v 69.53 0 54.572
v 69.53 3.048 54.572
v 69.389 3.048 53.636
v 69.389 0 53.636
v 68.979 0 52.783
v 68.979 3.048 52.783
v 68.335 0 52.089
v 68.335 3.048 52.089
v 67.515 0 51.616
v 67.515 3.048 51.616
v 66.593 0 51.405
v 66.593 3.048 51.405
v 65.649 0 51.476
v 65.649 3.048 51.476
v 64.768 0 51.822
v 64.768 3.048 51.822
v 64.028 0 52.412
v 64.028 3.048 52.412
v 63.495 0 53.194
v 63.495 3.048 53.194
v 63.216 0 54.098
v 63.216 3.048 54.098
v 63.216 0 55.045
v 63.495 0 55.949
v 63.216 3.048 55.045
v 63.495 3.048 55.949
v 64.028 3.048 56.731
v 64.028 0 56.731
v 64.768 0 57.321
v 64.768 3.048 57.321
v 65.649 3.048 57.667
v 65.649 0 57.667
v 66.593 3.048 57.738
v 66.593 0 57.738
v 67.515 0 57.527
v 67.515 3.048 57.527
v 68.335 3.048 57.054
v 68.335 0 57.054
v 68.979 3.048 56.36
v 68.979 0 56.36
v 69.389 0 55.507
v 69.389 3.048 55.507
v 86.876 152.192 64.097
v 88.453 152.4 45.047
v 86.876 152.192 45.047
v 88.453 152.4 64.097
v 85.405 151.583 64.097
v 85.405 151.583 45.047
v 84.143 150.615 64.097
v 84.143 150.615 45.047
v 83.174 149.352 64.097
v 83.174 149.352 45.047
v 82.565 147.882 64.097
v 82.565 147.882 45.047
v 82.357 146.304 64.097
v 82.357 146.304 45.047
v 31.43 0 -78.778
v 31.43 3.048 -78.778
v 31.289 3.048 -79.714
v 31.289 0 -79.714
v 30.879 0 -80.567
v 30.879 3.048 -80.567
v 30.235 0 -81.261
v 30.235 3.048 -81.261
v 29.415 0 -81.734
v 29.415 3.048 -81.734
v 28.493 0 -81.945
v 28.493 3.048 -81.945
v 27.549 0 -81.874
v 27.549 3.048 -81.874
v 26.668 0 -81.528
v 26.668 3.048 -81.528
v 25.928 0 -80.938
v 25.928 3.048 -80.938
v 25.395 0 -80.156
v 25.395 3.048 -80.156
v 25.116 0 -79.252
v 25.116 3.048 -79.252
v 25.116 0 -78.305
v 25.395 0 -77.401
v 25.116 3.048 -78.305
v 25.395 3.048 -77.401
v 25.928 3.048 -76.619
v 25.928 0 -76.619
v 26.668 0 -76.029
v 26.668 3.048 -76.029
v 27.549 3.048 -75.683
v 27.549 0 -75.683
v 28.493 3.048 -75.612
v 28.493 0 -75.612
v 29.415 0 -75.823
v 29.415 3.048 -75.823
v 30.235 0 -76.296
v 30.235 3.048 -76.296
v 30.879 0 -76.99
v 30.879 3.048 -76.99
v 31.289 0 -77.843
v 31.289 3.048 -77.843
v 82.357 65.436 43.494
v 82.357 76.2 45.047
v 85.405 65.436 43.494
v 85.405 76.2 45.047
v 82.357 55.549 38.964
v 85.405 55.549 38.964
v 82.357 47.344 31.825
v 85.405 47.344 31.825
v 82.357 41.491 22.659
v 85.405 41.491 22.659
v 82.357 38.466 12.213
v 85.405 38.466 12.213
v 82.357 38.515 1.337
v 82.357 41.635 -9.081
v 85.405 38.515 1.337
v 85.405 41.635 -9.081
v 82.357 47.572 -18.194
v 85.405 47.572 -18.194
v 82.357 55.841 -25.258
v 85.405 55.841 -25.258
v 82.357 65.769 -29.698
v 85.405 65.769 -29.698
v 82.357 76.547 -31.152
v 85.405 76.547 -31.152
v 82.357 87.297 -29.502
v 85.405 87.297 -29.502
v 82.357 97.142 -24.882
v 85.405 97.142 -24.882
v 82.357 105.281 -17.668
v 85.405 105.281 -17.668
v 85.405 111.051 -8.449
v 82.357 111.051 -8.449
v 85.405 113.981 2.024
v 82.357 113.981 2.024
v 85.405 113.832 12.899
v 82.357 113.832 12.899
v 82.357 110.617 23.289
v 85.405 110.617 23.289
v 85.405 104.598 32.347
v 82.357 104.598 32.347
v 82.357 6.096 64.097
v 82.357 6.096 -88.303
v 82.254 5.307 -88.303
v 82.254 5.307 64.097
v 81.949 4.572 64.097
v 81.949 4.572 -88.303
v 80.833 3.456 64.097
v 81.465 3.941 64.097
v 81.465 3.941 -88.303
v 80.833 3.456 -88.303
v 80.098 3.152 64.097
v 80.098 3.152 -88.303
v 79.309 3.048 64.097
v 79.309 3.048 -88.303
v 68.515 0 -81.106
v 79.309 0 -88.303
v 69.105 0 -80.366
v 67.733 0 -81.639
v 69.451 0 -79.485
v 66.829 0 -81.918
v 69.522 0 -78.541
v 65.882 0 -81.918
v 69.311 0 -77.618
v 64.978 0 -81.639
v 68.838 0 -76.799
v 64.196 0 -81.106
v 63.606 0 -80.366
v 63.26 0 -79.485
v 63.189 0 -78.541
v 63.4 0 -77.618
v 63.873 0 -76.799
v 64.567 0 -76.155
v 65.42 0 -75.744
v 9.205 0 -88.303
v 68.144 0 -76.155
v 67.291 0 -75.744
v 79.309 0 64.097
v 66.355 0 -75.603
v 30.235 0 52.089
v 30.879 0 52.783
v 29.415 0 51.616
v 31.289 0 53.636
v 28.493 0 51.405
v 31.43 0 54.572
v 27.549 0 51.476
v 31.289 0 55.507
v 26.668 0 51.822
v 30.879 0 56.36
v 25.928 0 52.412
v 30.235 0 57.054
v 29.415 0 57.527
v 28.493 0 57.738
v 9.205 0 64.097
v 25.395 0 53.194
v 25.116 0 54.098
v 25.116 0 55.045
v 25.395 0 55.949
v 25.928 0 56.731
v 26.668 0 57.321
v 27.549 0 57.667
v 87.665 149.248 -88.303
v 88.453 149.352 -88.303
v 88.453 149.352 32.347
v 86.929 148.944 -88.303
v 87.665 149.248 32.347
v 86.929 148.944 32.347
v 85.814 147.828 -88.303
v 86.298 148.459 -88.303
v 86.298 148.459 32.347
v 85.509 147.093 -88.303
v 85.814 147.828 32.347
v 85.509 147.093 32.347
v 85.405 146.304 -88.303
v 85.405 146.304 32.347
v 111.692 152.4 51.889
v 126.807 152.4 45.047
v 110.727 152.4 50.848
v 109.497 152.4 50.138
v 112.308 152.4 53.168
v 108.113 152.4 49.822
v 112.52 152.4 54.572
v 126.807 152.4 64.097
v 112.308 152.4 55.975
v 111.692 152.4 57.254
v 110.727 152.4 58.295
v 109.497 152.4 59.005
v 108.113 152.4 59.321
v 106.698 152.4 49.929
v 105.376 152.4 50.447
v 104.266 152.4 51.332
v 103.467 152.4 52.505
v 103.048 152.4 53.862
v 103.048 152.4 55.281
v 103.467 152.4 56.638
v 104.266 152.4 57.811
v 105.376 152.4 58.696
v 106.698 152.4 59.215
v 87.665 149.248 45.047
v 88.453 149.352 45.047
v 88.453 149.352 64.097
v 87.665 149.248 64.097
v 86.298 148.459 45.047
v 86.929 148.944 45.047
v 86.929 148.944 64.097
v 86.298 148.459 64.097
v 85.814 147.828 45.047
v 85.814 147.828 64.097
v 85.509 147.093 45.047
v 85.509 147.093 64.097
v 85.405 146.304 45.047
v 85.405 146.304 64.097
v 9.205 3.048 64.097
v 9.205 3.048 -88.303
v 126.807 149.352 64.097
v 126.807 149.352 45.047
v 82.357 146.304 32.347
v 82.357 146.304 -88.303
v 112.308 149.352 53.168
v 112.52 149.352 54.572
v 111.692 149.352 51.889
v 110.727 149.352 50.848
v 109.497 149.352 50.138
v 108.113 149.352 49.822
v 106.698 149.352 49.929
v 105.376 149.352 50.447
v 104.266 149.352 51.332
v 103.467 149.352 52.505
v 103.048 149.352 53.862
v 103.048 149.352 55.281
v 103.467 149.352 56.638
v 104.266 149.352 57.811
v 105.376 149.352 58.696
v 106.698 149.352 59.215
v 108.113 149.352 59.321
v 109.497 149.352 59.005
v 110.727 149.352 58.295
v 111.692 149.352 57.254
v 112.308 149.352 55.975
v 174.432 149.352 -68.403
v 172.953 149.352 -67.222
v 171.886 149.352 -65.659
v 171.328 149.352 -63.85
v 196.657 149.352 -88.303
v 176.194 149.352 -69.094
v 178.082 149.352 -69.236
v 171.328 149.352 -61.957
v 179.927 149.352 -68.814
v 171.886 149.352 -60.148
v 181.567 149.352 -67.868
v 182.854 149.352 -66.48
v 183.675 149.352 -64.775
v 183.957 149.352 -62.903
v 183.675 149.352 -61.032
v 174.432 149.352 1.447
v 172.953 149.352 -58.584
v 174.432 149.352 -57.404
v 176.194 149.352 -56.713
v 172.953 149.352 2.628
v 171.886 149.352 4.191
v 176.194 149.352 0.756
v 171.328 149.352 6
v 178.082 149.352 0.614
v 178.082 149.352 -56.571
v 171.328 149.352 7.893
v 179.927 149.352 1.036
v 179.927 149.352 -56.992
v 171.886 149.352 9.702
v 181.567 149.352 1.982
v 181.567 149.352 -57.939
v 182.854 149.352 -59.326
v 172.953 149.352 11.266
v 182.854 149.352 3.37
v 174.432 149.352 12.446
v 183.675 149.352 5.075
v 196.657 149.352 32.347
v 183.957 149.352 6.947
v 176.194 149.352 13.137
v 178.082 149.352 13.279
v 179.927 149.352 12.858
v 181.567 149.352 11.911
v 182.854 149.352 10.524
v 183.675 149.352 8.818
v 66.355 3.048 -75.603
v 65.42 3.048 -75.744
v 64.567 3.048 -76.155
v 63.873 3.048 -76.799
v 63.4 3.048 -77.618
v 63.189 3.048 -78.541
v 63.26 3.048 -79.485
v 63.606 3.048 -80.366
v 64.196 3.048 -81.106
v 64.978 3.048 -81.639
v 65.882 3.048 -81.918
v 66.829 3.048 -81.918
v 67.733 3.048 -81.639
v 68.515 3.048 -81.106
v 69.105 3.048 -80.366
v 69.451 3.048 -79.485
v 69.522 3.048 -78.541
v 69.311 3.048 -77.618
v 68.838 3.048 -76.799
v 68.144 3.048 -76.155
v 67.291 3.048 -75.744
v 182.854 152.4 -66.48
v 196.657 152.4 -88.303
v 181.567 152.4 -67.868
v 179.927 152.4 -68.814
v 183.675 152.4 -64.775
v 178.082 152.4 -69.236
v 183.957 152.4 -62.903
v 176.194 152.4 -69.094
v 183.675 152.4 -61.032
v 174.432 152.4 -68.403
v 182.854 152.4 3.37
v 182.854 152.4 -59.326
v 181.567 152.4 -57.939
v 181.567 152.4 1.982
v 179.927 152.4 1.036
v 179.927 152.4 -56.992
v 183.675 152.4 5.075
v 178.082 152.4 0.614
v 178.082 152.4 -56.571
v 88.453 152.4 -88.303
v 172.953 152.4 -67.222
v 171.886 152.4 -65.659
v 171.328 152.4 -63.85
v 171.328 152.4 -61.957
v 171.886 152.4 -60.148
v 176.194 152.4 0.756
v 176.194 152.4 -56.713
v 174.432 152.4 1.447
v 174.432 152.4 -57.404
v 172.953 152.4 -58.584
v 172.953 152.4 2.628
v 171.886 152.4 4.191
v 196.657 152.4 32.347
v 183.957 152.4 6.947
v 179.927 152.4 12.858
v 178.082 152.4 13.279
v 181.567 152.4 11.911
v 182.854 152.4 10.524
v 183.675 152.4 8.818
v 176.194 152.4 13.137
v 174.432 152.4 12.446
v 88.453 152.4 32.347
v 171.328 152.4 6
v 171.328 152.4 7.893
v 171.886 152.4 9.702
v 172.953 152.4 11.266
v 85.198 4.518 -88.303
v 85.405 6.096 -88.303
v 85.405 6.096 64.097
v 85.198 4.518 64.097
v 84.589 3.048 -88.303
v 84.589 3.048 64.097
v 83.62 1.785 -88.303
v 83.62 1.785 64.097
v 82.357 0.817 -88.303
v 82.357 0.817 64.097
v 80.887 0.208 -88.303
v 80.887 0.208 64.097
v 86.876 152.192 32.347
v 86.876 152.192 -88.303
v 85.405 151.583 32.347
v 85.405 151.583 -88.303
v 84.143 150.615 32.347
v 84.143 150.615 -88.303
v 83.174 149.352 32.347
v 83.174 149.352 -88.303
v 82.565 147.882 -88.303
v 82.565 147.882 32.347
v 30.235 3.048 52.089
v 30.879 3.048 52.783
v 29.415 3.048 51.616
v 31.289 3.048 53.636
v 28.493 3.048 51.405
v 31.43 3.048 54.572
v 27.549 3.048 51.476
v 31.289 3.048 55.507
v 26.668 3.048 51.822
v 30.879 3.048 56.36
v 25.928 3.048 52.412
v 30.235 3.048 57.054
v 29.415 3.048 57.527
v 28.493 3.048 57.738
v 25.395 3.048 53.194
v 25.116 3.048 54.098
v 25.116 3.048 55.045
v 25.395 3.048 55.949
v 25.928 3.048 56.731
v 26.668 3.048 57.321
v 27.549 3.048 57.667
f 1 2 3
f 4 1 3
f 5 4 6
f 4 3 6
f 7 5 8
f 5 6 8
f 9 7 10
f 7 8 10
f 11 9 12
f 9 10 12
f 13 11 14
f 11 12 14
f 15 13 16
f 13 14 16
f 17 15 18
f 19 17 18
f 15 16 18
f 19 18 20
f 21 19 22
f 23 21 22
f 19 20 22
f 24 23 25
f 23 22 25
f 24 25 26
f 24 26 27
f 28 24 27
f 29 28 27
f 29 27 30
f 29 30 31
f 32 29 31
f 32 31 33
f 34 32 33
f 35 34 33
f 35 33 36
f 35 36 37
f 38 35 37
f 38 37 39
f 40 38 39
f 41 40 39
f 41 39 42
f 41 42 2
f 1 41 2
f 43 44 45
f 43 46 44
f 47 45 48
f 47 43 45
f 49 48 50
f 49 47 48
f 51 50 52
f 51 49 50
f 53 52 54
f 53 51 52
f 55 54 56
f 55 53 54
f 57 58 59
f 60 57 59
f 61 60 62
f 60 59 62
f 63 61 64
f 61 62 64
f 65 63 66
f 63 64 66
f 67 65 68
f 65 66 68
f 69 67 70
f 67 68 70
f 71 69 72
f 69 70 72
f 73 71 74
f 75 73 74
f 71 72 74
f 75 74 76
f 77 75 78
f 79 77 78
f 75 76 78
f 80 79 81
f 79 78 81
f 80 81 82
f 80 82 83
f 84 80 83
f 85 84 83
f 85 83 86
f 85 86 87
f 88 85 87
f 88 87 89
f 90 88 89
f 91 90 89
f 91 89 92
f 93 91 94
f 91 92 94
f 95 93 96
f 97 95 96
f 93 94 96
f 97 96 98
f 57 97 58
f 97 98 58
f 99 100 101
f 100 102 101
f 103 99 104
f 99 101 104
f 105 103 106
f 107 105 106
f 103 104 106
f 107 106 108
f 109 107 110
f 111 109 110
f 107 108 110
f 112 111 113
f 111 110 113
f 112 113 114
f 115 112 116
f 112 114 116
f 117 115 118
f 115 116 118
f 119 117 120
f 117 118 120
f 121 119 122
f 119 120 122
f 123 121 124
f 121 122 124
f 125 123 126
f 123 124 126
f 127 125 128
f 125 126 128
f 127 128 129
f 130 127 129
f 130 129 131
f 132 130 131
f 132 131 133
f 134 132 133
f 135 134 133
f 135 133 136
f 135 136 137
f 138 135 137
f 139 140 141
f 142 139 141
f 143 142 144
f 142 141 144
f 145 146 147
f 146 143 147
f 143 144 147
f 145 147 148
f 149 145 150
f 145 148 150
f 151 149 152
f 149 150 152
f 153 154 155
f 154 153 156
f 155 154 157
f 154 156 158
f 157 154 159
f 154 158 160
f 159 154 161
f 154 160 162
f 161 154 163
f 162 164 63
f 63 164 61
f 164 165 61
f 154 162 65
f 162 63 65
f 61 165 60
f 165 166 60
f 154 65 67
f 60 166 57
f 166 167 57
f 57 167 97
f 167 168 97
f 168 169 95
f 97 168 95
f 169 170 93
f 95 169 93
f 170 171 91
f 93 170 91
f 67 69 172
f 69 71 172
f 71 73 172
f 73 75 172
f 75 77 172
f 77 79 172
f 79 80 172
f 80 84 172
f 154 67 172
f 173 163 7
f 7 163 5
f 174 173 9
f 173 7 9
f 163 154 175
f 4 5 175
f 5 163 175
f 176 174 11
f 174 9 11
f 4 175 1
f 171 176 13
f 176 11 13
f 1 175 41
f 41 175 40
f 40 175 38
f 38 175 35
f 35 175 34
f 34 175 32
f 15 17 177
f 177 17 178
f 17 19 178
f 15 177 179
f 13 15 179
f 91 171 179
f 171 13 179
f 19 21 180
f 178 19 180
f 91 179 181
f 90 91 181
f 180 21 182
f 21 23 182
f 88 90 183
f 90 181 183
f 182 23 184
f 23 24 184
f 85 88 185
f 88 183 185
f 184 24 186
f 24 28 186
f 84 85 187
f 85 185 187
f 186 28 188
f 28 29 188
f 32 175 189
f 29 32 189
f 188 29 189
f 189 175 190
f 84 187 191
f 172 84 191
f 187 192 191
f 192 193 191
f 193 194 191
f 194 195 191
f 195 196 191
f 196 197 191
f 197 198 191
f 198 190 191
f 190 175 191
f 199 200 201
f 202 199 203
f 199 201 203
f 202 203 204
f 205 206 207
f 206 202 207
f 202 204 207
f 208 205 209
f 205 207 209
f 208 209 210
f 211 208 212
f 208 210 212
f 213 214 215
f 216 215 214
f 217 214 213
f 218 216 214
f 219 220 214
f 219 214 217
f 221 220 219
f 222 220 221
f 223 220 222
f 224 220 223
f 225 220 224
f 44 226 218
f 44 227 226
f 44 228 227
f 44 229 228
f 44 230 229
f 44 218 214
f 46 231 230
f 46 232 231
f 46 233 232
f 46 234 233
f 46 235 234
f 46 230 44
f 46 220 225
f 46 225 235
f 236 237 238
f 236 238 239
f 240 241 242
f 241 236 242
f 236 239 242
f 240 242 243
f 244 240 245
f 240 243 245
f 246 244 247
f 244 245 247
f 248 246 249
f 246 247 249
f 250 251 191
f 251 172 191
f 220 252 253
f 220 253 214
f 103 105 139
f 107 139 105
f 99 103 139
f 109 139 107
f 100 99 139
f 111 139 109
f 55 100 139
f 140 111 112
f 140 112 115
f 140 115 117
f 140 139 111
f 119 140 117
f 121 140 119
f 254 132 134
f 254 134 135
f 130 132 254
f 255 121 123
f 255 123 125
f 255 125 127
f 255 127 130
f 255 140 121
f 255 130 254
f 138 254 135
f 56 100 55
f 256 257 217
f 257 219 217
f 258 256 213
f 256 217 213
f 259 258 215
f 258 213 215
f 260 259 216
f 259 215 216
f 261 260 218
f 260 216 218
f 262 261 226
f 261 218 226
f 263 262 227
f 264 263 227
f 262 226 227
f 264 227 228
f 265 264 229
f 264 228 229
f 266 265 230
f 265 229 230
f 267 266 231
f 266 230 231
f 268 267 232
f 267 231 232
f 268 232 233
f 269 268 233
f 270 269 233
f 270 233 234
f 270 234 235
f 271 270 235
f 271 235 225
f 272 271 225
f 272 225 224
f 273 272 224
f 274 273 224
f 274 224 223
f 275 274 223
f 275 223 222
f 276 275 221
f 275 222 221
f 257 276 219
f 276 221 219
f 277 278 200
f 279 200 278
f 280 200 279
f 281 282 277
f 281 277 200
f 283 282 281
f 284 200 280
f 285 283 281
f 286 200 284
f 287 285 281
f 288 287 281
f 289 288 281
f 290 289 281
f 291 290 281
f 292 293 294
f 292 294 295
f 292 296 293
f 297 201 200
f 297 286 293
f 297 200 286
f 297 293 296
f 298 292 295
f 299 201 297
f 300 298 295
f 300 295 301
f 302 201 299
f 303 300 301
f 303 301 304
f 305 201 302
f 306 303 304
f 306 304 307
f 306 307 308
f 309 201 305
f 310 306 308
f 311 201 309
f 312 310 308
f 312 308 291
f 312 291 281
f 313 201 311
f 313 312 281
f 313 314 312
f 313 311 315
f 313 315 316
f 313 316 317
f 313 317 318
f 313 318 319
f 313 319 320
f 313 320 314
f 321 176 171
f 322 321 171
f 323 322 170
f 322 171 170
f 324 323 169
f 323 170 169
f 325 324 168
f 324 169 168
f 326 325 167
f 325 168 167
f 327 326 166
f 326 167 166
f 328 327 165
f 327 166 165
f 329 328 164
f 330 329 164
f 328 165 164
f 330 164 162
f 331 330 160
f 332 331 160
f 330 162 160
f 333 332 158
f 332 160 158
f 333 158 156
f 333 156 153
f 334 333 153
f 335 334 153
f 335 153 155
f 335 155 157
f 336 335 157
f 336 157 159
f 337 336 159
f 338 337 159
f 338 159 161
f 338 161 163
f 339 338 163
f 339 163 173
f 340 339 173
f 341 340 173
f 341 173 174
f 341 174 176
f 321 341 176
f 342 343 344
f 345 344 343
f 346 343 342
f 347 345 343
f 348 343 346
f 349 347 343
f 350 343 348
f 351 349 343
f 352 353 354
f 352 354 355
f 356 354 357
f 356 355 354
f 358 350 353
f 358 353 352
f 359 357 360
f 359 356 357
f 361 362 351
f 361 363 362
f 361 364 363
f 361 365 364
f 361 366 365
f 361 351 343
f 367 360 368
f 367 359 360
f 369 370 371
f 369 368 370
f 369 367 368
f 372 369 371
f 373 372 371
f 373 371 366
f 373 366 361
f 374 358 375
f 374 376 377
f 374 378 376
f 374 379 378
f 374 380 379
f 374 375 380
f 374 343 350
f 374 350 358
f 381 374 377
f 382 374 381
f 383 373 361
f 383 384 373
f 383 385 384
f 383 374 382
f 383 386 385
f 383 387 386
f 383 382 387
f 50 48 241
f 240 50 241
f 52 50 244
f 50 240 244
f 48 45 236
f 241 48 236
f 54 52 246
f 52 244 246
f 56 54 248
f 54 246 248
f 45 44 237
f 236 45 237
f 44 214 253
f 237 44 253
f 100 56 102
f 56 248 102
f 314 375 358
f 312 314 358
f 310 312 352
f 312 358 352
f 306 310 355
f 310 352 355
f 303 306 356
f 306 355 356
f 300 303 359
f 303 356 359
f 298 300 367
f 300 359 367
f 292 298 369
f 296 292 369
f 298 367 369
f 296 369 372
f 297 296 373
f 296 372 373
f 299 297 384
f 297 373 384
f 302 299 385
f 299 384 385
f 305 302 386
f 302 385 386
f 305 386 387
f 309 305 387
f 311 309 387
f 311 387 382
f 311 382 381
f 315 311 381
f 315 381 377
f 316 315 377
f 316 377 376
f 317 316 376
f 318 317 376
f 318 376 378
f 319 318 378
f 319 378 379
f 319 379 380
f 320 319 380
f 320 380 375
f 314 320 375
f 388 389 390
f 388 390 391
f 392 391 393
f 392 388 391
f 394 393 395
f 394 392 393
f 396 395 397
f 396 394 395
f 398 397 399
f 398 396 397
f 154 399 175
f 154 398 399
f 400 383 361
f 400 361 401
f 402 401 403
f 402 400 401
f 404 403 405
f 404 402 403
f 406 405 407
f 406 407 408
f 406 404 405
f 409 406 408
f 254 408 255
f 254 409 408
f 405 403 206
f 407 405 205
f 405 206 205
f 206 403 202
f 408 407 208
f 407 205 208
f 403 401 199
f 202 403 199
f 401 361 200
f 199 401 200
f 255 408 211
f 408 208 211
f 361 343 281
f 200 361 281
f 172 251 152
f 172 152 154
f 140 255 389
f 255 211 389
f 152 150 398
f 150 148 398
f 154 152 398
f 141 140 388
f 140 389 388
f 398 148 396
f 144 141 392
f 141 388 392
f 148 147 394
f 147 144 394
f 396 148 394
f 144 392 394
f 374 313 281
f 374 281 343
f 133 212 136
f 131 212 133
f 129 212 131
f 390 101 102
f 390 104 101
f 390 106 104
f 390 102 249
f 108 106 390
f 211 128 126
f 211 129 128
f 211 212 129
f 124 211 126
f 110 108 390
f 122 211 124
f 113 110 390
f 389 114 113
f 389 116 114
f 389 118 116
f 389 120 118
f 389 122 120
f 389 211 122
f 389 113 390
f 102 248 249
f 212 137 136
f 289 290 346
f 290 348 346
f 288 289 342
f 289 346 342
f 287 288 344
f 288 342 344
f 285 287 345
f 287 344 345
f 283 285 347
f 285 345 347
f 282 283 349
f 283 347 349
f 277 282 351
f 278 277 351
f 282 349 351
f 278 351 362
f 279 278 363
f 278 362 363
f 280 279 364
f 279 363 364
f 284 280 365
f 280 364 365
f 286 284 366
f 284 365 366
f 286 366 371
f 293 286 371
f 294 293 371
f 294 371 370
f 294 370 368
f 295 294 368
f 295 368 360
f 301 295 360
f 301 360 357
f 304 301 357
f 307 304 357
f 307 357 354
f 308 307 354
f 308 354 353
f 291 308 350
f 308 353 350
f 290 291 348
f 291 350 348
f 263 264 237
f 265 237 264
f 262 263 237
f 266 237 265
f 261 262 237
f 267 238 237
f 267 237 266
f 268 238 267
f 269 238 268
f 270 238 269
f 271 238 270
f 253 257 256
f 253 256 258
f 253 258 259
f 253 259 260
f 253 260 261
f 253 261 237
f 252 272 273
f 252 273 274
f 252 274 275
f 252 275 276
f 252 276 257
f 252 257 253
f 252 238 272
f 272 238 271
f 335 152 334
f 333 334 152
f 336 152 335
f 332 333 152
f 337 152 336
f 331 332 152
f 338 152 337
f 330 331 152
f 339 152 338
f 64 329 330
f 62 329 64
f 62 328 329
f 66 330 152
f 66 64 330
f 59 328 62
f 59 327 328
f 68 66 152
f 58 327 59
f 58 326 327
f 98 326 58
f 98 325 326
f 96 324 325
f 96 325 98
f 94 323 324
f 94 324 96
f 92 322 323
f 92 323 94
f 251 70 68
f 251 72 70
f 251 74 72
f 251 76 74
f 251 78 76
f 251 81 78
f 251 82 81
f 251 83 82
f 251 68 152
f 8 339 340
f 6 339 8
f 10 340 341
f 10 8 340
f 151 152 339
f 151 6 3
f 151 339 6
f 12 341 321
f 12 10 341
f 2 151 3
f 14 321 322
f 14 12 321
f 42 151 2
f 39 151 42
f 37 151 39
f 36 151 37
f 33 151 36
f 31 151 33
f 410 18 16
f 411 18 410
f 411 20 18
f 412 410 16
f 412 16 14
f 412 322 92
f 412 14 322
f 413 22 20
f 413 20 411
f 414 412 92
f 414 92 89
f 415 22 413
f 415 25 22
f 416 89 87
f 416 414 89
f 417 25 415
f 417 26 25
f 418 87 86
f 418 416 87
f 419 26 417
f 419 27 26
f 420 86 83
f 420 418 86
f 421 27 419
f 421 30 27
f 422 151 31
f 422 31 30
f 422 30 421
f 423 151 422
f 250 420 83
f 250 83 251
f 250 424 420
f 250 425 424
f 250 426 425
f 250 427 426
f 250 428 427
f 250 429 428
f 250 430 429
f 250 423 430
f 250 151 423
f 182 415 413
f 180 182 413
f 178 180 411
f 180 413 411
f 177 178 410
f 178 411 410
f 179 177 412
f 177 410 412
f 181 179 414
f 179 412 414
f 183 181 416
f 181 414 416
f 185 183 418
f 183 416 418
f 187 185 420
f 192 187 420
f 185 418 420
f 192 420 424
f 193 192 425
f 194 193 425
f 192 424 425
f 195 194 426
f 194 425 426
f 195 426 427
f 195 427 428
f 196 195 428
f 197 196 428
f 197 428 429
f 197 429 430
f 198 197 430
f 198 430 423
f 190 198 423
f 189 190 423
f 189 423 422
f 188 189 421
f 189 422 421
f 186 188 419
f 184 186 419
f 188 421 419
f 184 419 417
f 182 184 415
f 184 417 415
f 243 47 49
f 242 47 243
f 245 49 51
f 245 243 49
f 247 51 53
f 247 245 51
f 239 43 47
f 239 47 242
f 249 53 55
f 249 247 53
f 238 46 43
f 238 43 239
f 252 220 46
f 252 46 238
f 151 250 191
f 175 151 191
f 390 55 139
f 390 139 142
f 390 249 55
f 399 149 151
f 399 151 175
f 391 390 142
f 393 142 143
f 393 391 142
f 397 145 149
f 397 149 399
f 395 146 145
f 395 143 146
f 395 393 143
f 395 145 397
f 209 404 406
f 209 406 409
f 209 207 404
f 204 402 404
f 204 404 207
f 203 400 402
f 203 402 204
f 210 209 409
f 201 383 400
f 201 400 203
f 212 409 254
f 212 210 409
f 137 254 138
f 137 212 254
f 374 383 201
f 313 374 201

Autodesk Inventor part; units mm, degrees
ref_plane "YZ Plane" through (0, 0, 0) normal (1, 0, 0) x (0, 1, 0)
ref_plane "XZ Plane" through (0, 0, 0) normal (0, 1, 0) x (-1, 0, 0)
ref_plane "XY Plane" through (0, 0, 0) normal (0, 0, 1) x (1, 0, 0)
sketch "Sketch1" plane through (0, 0, 0) normal (0, 1, 0) x (-1, 0, 0)
  line L0 (-9.2054, 64.0966) -> (-85.4054, 64.0966)
  line L1 (-85.4054, 64.0966) -> (-85.4054, -88.3034)
  line L2 (-85.4054, -88.3034) -> (-9.2054, -88.3034)
  line L3 (-9.2054, -88.3034) -> (-9.2054, 64.0966)
  point P0 (0, 0)
  dimension "d0" = 152.4
  dimension "d1" = 76.2
extrude "Plate1" add sketch "Sketch1" along normal blind 3.048
sketch "Sketch2" plane through (82.3574, 0, -88.3034) normal (1, 0, 0) x (0, 1, 0)
  line L0 (0, 152.4) -> (0, 0)
  line L1 (0, 0) -> (152.4, 0)
  line L2 (152.4, 0) -> (152.4, 152.4)
  line L3 (152.4, 152.4) -> (0, 152.4)
edge flange "Flange1" height 152.4 angle 90 thickness 3.048 bend radius 3.048 thickness toward (1, 0, 0) relief tear relief width 3.048 relief depth 1.524 edges at (85.4054, 3.048, -12.1034) wall of the first edge with corners at (82.3574, 0, 64.0966) (82.3574, 0, -88.3034) (82.3574, 152.4, -88.3034) (82.3574, 152.4, 64.0966)
bend "Bend1"
corner "Corner1"
sketch "Sketch3" plane through (85.4054, 152.4, 64.0966) normal (1, 0, 0) x (0, 0, -1)
  circle A0 centre (57.15, -76.2) radius 38.1
  line L0 (152.4, 0) -> (152.4, -146.304) projected
  line L1 (152.4, -152.4) -> (0, -152.4) projected
  point P0 (64.0966, -152.4)
  dimension "d13" = 76.2
  dimension "d14" = 95.25
  dimension "d15" = 76.2
extrude "Cut1" cut sketch "Sketch3" against normal blind 3.048
sketch "Sketch4" plane through (85.4054, 152.4, 64.0966) normal (1, 0, 0) x (0, 0, -1)
  circle A0 centre (57.15, -76.2) radius 38.1 projected
  line L0 (19.05, -76.2) -> (19.05, 0)
  line L1 (19.05, 0) -> (31.75, 0)
  line L2 (0, 0) -> (152.4, 0) projected
  line L3 (19.05, 0) -> (31.75, 0)
  line L4 (31.75, 0) -> (31.75, -47.8019)
  arc A1 (31.75, -47.8019) -> (19.05, -76.2) centre (57.15, -76.2) ccw
  point P0 (64.0966, -152.4)
  dimension "d18" = 12.7
extrude "Cut2" cut sketch "Sketch4" against normal blind 3.048 contours A0 L0 L1 L4
sketch "Sketch5" plane through (82.3574, 149.352, 32.3466) normal (0, 1, 0) x (-1, 0, 0)
  line L0 (0, -120.65) -> (0, 0)
  line L1 (0, 0) -> (-114.3, 0)
  line L2 (-114.3, 0) -> (-114.3, -120.65)
  line L3 (-114.3, -120.65) -> (0, -120.65)
edge flange "Flange2" height 114.3 angle 90 thickness 3.048 bend radius 3.048 thickness toward (0, 1, 0) relief tear relief width 3.048 relief depth 1.524 edges at (85.4054, 152.4, -27.9784) wall of the first edge with corners at (82.3574, 149.352, -88.3034) (82.3574, 149.352, 32.3466) (196.6574, 149.352, 32.3466) (196.6574, 149.352, -88.3034)
bend "Bend2"
corner "Corner2"
sketch "Sketch6" plane through (196.6574, 152.4, 32.3466) normal (0, 1, 0) x (1, 0, 0)
  line L0 (0, 120.65) -> (0, 0) projected
  line L1 (0, 0) -> (-108.204, 0) projected
  point P0 (-196.6574, 32.3466)
sketch "Sketch7" plane through (82.3574, 149.352, 64.0966) normal (0, 1, 0) x (-1, 0, 0)
  line L0 (0, -19.05) -> (0, 0)
  line L1 (0, 0) -> (-44.45, 0)
  line L2 (-44.45, 0) -> (-44.45, -19.05)
  line L3 (-44.45, -19.05) -> (0, -19.05)
edge flange "Flange3" height 44.45 angle 90 thickness 3.048 bend radius 3.048 thickness toward (0, 1, 0) relief tear relief width 3.048 relief depth 1.524 edges at (85.4054, 152.4, 54.5716) wall of the first edge with corners at (82.3574, 149.352, 45.0466) (82.3574, 149.352, 64.0966) (126.8074, 149.352, 64.0966) (126.8074, 149.352, 45.0466)
bend "Bend3"
corner "Corner3"
sketch "Sketch8" plane through (196.6574, 152.4, 32.3466) normal (0, 1, 0) x (1, 0, 0)
  circle A0 centre (-19.05, 95.25) radius 6.35
  line L0 (0, 120.65) -> (0, 0) projected
  circle A1 centre (-19.05, 25.4) radius 6.35 projected
  point P0 (-196.6574, 32.3466)
  dimension "d46" = 12.7
  dimension "d47" = 19.05
  dimension "d48" = 69.85
extrude "Cut4" cut sketch "Sketch8" against normal blind 3.048 contours A0
sketch "Sketch9" plane through (126.8074, 152.4, 64.0966) normal (0, 1, 0) x (1, 0, 0)
  circle A0 centre (-19.05, 9.525) radius 4.7625
  line L0 (0, 0) -> (-38.354, 0) projected
  line L1 (0, 19.05) -> (0, 0) projected
  point P0 (-126.8074, 64.0966)
  dimension "d51" = 9.525
  dimension "d52" = 9.525
  dimension "d53" = 19.05
extrude "Cut5" cut sketch "Sketch9" against normal blind 3.048
sketch "Sketch10" plane through (196.6574, 152.4, 32.3466) normal (0, 1, 0) x (1, 0, 0)
  circle A0 centre (-19.05, 25.4) radius 6.35
  line L0 (0, 120.65) -> (0, 0) projected
  circle A1 centre (-19.05, 95.25) radius 6.35 projected
  point P0 (-196.6574, 32.3466)
  dimension "d56" = 12.7
  dimension "d57" = 19.05
  dimension "d58" = 69.85
extrude "Cut6" cut sketch "Sketch10" against normal blind 3.048 contours A0
sketch "Sketch11" plane through (0, 3.048, 0) normal (0, 1, 0) x (1, 0, 0)
  circle A0 centre (28.2554, -54.5716) radius 3.175
  circle A1 centre (66.3554, -54.5716) radius 3.175
  line L0 (79.3094, -64.0966) -> (9.2054, -64.0966) projected
  line L1 (9.2054, -64.0966) -> (9.2054, 88.3034) projected
  line L2 (9.2054, 88.3034) -> (79.3094, 88.3034) projected
  circle A2 centre (28.2554, 78.7784) radius 3.175
  circle A3 centre (66.3554, 81.9534) radius 3.175
  point P0 (0, 0)
  dimension "d61" = 6.35
  dimension "d62" = 6.35
  dimension "d63" = 38.1
  dimension "d64" = 9.525
  dimension "d65" = 9.525
  dimension "d67" = 19.05
  dimension "d68" = 9.525
  dimension "d69" = 6.35
  dimension "d70" = 19.05
  dimension "d71" = 6.35
  dimension "d72" = 6.35
sketch "Sketch12" plane through (0, 3.048, 0) normal (0, 1, 0) x (1, 0, 0)
  circle A0 centre (66.3554, 78.7784) radius 3.175
  line L0 (9.2054, 88.3034) -> (79.3094, 88.3034) projected
  line L1 (9.2054, -64.0966) -> (9.2054, 88.3034) projected
  point P0 (0, 0)
  dimension "d73" = 6.35
  dimension "d74" = 9.525
  dimension "d75" = 57.15
extrude "Cut7" cut sketch "Sketch11" against normal blind 3.048 contours A0 | A1 | A2
hole "Hole1" at (66.3554, 3.048, -78.7784) direction (0, -1, 0) diameter 6.35 depth 3.048 tip angle 118
equation "\"d16\" = Thickness"
equation "\"d19\" = Thickness"
equation "\"d49\" = Thickness"
equation "\"d54\" = Thickness"
equation "\"d59\" = Thickness"
equation "\"d76\" = Thickness"
equation "\"d83\" = Thickness"
equation "\"d3\" = BendReliefWidth"
equation "\"d4\" = BendReliefDepth"
equation "\"d5\" = MinimumRemnant"
equation "\"d6\" = BendRadius"
equation "\"d9\" = BendRadius"
equation "\"d10\" = CornerReliefSize"
equation "\"d11\" = GapSize"
equation "\"d12\" = JacobiRadiusSize"
equation "\"d21\" = BendReliefWidth"
equation "\"d22\" = BendReliefDepth"
equation "\"d23\" = MinimumRemnant"
equation "\"d24\" = BendRadius"
equation "\"d27\" = BendRadius"
equation "\"d28\" = CornerReliefSize"
equation "\"d29\" = GapSize"
equation "\"d30\" = JacobiRadiusSize"
equation "\"d34\" = BendReliefWidth"
equation "\"d35\" = BendReliefDepth"
equation "\"d36\" = MinimumRemnant"
equation "\"d37\" = BendRadius"
equation "\"d40\" = BendRadius"
equation "\"d41\" = CornerReliefSize"
equation "\"d42\" = GapSize"
equation "\"d43\" = JacobiRadiusSize"
equation "\"BendRadius\" = Thickness"
equation "\"BendReliefWidth\" = Thickness"
equation "\"BendReliefDepth\" = 0.5 * Thickness"
equation "\"CornerReliefSize\" = 4 * Thickness"
equation "\"MinimumRemnant\" = 2 * Thickness"
equation "\"TransitionRadius\" = BendRadius"
equation "\"JacobiRadiusSize\" = BendRadius"
equation "\"GapSize\" = Thickness"
equation "\"d2\" = BendRadius"
equation "\"Thickness\" = 3.048"
properties part number "Tape Measure Dispenser Side 1"
